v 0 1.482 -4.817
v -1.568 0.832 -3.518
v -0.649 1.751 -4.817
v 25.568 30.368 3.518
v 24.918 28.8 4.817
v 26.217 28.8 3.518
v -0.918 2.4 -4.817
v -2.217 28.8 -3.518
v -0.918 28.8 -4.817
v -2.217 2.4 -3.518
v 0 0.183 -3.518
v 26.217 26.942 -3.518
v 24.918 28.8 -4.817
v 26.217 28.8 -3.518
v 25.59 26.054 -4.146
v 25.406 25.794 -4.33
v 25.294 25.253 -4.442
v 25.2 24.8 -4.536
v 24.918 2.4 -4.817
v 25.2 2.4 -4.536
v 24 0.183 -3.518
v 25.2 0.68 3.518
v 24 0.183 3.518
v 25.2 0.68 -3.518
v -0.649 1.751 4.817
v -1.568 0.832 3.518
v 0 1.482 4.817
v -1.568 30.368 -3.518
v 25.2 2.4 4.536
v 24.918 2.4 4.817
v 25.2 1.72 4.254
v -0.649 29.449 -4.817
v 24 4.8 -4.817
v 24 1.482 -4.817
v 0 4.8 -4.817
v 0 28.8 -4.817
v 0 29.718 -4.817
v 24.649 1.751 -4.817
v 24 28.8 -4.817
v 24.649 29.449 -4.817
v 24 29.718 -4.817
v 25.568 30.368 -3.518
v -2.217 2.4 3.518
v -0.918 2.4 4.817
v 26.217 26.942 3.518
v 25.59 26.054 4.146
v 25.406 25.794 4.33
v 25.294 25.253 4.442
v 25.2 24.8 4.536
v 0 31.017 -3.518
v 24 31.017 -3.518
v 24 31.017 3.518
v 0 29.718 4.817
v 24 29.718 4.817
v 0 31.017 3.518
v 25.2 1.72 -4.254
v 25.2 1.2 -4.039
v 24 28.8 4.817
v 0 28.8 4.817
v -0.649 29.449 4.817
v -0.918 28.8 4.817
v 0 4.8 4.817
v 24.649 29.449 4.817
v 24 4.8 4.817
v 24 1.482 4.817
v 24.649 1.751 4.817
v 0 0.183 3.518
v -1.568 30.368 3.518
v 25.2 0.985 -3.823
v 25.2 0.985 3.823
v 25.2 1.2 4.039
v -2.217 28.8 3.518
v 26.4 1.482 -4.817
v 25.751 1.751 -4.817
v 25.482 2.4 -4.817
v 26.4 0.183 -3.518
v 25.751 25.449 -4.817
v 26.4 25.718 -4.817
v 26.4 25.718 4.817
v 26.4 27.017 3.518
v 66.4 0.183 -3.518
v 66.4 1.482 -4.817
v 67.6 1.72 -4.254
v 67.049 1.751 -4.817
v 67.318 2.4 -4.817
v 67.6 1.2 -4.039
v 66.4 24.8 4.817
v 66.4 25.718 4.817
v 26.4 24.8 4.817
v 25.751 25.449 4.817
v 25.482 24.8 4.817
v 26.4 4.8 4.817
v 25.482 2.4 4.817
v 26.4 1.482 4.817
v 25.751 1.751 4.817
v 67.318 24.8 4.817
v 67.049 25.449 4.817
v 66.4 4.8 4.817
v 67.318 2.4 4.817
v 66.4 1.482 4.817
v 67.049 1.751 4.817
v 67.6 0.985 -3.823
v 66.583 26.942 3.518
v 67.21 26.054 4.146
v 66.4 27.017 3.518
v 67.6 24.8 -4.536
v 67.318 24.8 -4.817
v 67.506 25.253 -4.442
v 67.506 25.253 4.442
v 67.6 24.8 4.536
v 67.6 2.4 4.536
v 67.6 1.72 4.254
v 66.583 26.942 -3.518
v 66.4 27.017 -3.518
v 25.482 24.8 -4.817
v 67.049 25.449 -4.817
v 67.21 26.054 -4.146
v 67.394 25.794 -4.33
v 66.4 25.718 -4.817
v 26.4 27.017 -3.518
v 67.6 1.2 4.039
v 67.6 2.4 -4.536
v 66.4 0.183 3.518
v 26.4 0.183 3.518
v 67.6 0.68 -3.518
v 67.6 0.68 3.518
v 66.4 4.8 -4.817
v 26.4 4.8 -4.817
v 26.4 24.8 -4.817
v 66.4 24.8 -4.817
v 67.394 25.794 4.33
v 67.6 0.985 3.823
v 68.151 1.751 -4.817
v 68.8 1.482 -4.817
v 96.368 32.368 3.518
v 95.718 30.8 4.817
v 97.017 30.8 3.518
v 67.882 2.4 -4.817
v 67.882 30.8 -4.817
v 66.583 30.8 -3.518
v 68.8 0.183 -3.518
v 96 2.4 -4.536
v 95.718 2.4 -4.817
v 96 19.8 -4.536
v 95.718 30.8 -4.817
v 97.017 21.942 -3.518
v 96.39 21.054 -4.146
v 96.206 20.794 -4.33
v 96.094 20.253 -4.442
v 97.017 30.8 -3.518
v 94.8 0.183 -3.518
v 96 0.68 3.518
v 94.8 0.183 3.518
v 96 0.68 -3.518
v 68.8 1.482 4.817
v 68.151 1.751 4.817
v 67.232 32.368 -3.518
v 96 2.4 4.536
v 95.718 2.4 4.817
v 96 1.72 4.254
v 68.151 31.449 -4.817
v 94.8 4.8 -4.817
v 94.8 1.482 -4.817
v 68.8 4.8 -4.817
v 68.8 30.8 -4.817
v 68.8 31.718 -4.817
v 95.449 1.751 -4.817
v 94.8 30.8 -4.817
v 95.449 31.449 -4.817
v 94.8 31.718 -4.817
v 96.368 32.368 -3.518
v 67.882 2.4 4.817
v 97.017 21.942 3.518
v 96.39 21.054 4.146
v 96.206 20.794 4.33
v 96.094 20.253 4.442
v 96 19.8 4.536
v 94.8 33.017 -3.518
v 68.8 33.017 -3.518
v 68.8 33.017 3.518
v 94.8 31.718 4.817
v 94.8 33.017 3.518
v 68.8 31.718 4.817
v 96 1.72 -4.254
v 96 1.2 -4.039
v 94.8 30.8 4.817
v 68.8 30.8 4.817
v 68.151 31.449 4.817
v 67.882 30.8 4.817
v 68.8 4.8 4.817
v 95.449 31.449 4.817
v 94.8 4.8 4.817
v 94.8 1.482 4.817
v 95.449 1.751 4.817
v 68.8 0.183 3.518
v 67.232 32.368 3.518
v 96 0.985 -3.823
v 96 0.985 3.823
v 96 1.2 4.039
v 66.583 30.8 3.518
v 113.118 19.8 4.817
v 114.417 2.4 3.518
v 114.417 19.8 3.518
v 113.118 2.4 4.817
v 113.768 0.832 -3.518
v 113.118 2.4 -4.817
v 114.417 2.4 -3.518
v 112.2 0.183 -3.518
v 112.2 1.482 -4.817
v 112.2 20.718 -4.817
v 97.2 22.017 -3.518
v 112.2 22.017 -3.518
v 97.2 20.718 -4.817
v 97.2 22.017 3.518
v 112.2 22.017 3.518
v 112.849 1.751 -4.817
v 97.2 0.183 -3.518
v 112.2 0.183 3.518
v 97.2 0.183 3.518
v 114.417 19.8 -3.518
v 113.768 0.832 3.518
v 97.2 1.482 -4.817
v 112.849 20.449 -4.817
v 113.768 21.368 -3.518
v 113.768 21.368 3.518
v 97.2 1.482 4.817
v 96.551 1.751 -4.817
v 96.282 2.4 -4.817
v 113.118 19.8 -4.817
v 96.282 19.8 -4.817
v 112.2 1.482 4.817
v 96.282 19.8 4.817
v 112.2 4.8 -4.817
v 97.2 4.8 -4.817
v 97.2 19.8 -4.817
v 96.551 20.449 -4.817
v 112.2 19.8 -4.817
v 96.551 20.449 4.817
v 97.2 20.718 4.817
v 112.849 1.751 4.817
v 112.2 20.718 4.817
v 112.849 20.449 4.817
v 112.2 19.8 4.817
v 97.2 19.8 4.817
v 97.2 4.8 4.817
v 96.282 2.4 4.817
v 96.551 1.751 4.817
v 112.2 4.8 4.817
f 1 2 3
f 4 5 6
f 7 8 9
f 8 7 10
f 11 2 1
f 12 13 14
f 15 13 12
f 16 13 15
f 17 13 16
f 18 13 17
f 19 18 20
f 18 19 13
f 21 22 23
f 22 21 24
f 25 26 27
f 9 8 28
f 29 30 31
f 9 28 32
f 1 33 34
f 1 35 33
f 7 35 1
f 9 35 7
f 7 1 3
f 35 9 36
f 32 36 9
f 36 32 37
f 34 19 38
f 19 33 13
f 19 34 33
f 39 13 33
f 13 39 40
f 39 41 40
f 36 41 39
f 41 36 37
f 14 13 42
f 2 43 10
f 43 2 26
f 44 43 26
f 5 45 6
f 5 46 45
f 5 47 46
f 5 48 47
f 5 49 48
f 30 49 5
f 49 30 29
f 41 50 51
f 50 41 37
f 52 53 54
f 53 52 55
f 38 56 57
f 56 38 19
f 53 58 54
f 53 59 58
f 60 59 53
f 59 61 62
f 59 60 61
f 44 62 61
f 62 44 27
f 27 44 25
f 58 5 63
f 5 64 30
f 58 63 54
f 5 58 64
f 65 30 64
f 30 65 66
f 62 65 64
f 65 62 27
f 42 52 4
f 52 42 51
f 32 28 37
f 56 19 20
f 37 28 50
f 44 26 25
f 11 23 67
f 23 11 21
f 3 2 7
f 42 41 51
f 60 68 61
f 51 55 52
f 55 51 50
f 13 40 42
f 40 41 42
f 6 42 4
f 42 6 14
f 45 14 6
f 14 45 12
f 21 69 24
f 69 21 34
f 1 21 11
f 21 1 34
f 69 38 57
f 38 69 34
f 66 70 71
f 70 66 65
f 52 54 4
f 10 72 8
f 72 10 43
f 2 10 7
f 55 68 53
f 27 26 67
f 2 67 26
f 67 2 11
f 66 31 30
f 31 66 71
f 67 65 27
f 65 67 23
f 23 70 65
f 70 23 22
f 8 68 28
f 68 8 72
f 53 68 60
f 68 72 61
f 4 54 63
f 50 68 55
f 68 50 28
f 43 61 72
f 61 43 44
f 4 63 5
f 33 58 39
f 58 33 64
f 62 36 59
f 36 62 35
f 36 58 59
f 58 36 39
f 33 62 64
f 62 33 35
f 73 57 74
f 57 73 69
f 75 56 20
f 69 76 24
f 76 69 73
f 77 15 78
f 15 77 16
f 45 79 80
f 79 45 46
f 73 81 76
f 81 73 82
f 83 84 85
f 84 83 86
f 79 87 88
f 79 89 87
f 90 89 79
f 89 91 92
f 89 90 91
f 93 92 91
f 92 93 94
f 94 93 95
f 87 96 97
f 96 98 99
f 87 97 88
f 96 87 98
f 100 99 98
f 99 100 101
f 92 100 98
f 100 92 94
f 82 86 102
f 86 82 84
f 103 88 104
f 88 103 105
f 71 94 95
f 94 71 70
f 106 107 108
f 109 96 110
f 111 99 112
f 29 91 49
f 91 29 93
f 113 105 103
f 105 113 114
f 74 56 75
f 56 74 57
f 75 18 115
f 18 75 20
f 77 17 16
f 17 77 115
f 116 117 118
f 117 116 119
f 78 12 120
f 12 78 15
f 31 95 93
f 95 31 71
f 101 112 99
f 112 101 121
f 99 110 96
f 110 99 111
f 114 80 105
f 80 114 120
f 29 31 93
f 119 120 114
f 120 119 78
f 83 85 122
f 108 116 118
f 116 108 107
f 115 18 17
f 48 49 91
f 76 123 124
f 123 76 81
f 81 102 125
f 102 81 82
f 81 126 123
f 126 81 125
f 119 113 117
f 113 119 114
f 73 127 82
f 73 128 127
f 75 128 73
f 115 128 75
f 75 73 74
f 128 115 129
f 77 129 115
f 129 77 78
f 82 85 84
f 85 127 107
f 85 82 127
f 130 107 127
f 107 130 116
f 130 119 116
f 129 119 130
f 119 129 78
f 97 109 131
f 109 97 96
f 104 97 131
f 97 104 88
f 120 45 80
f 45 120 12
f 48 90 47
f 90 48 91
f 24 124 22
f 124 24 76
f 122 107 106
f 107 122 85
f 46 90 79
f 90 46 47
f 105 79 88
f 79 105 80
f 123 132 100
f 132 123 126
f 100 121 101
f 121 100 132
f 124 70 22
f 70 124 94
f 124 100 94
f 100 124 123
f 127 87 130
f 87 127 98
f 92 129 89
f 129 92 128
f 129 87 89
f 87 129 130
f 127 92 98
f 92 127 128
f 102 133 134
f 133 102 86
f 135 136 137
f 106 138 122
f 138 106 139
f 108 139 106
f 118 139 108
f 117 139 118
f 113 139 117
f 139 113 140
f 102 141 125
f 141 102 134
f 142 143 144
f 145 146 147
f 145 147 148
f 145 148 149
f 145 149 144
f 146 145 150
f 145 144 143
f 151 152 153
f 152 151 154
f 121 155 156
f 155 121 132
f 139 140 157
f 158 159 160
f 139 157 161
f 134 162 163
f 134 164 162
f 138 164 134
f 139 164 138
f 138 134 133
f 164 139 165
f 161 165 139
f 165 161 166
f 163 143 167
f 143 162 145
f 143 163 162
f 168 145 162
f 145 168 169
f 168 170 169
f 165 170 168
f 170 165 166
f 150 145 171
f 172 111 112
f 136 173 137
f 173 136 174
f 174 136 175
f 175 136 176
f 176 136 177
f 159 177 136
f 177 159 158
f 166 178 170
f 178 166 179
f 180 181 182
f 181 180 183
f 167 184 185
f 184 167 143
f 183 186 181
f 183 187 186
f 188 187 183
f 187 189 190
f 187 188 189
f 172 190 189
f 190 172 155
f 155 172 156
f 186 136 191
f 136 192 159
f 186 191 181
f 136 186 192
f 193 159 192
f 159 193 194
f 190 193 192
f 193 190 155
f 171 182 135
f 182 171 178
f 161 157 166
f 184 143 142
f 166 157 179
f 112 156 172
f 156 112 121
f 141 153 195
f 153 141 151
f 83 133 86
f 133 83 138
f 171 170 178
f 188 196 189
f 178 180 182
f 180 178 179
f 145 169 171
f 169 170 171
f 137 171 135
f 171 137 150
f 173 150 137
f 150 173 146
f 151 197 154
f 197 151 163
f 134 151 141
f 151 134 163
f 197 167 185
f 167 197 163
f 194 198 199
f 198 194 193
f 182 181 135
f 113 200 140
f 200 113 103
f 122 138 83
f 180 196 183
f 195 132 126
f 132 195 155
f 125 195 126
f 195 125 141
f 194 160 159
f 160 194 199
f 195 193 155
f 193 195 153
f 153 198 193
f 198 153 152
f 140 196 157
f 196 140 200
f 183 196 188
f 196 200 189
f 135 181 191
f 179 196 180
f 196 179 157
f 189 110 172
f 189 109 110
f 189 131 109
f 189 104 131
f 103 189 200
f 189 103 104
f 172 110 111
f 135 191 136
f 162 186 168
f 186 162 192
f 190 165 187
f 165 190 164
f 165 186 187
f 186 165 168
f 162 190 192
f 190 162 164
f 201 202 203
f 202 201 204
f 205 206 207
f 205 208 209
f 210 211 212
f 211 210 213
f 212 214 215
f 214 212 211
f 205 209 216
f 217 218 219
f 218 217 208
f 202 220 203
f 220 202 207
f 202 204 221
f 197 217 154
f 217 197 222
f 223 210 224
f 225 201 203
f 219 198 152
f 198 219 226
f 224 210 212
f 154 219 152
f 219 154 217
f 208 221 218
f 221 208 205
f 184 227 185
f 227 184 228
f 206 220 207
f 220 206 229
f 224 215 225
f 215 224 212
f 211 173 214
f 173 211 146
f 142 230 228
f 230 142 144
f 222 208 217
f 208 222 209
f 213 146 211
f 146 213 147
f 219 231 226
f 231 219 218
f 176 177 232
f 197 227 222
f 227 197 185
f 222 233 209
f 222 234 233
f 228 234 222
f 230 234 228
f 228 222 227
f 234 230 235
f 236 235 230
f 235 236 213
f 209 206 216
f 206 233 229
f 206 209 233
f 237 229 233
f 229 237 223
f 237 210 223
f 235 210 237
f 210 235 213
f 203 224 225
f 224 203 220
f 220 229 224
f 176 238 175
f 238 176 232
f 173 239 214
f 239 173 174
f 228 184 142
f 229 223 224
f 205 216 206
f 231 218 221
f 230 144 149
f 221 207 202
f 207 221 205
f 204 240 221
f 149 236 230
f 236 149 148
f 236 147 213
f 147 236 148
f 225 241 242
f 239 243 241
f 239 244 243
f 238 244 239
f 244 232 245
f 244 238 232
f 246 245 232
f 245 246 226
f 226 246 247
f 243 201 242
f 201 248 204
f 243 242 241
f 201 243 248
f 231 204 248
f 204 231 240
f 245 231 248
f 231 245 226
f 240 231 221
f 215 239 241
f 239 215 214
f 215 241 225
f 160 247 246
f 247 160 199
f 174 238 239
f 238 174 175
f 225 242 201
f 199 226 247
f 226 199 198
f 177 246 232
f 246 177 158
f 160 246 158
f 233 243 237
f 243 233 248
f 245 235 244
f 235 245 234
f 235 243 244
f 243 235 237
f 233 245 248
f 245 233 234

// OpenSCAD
// organizer to hold specific pocket items in a flat row

thickness = 10; // mm
wall_thickness = 2.4; //mm

holders([
         [24, 24],
         [40, 20],
         [26, 26],
         [15, 15],
         ]);

function first(lst) = lst[0];
function rest(lst) = (len(lst) <= 1) ? [] : [for (i = [1:len(lst)-1]) lst[i]];

module holder(width, height) {
  translate([width/2,height/2+1.5*wall_thickness,0]) {
    difference() {
      minkowski() {
        cube([width, height+wall_thickness, thickness-2*wall_thickness], center=true);
        sphere(r=wall_thickness);
      }
      translate([0,wall_thickness/2, 0]) {
        cube([width, height, thickness+0.01], center=true);
      }
    }
  }
}

module holders(dimensions) {
  dim = first(dimensions);
  if (dim) {
    holder(dim[0], dim[1]);
    others = rest(dimensions);

    translate([dim[0] + wall_thickness, 0, 0]) {
      holders(others);
    }
  }
}
